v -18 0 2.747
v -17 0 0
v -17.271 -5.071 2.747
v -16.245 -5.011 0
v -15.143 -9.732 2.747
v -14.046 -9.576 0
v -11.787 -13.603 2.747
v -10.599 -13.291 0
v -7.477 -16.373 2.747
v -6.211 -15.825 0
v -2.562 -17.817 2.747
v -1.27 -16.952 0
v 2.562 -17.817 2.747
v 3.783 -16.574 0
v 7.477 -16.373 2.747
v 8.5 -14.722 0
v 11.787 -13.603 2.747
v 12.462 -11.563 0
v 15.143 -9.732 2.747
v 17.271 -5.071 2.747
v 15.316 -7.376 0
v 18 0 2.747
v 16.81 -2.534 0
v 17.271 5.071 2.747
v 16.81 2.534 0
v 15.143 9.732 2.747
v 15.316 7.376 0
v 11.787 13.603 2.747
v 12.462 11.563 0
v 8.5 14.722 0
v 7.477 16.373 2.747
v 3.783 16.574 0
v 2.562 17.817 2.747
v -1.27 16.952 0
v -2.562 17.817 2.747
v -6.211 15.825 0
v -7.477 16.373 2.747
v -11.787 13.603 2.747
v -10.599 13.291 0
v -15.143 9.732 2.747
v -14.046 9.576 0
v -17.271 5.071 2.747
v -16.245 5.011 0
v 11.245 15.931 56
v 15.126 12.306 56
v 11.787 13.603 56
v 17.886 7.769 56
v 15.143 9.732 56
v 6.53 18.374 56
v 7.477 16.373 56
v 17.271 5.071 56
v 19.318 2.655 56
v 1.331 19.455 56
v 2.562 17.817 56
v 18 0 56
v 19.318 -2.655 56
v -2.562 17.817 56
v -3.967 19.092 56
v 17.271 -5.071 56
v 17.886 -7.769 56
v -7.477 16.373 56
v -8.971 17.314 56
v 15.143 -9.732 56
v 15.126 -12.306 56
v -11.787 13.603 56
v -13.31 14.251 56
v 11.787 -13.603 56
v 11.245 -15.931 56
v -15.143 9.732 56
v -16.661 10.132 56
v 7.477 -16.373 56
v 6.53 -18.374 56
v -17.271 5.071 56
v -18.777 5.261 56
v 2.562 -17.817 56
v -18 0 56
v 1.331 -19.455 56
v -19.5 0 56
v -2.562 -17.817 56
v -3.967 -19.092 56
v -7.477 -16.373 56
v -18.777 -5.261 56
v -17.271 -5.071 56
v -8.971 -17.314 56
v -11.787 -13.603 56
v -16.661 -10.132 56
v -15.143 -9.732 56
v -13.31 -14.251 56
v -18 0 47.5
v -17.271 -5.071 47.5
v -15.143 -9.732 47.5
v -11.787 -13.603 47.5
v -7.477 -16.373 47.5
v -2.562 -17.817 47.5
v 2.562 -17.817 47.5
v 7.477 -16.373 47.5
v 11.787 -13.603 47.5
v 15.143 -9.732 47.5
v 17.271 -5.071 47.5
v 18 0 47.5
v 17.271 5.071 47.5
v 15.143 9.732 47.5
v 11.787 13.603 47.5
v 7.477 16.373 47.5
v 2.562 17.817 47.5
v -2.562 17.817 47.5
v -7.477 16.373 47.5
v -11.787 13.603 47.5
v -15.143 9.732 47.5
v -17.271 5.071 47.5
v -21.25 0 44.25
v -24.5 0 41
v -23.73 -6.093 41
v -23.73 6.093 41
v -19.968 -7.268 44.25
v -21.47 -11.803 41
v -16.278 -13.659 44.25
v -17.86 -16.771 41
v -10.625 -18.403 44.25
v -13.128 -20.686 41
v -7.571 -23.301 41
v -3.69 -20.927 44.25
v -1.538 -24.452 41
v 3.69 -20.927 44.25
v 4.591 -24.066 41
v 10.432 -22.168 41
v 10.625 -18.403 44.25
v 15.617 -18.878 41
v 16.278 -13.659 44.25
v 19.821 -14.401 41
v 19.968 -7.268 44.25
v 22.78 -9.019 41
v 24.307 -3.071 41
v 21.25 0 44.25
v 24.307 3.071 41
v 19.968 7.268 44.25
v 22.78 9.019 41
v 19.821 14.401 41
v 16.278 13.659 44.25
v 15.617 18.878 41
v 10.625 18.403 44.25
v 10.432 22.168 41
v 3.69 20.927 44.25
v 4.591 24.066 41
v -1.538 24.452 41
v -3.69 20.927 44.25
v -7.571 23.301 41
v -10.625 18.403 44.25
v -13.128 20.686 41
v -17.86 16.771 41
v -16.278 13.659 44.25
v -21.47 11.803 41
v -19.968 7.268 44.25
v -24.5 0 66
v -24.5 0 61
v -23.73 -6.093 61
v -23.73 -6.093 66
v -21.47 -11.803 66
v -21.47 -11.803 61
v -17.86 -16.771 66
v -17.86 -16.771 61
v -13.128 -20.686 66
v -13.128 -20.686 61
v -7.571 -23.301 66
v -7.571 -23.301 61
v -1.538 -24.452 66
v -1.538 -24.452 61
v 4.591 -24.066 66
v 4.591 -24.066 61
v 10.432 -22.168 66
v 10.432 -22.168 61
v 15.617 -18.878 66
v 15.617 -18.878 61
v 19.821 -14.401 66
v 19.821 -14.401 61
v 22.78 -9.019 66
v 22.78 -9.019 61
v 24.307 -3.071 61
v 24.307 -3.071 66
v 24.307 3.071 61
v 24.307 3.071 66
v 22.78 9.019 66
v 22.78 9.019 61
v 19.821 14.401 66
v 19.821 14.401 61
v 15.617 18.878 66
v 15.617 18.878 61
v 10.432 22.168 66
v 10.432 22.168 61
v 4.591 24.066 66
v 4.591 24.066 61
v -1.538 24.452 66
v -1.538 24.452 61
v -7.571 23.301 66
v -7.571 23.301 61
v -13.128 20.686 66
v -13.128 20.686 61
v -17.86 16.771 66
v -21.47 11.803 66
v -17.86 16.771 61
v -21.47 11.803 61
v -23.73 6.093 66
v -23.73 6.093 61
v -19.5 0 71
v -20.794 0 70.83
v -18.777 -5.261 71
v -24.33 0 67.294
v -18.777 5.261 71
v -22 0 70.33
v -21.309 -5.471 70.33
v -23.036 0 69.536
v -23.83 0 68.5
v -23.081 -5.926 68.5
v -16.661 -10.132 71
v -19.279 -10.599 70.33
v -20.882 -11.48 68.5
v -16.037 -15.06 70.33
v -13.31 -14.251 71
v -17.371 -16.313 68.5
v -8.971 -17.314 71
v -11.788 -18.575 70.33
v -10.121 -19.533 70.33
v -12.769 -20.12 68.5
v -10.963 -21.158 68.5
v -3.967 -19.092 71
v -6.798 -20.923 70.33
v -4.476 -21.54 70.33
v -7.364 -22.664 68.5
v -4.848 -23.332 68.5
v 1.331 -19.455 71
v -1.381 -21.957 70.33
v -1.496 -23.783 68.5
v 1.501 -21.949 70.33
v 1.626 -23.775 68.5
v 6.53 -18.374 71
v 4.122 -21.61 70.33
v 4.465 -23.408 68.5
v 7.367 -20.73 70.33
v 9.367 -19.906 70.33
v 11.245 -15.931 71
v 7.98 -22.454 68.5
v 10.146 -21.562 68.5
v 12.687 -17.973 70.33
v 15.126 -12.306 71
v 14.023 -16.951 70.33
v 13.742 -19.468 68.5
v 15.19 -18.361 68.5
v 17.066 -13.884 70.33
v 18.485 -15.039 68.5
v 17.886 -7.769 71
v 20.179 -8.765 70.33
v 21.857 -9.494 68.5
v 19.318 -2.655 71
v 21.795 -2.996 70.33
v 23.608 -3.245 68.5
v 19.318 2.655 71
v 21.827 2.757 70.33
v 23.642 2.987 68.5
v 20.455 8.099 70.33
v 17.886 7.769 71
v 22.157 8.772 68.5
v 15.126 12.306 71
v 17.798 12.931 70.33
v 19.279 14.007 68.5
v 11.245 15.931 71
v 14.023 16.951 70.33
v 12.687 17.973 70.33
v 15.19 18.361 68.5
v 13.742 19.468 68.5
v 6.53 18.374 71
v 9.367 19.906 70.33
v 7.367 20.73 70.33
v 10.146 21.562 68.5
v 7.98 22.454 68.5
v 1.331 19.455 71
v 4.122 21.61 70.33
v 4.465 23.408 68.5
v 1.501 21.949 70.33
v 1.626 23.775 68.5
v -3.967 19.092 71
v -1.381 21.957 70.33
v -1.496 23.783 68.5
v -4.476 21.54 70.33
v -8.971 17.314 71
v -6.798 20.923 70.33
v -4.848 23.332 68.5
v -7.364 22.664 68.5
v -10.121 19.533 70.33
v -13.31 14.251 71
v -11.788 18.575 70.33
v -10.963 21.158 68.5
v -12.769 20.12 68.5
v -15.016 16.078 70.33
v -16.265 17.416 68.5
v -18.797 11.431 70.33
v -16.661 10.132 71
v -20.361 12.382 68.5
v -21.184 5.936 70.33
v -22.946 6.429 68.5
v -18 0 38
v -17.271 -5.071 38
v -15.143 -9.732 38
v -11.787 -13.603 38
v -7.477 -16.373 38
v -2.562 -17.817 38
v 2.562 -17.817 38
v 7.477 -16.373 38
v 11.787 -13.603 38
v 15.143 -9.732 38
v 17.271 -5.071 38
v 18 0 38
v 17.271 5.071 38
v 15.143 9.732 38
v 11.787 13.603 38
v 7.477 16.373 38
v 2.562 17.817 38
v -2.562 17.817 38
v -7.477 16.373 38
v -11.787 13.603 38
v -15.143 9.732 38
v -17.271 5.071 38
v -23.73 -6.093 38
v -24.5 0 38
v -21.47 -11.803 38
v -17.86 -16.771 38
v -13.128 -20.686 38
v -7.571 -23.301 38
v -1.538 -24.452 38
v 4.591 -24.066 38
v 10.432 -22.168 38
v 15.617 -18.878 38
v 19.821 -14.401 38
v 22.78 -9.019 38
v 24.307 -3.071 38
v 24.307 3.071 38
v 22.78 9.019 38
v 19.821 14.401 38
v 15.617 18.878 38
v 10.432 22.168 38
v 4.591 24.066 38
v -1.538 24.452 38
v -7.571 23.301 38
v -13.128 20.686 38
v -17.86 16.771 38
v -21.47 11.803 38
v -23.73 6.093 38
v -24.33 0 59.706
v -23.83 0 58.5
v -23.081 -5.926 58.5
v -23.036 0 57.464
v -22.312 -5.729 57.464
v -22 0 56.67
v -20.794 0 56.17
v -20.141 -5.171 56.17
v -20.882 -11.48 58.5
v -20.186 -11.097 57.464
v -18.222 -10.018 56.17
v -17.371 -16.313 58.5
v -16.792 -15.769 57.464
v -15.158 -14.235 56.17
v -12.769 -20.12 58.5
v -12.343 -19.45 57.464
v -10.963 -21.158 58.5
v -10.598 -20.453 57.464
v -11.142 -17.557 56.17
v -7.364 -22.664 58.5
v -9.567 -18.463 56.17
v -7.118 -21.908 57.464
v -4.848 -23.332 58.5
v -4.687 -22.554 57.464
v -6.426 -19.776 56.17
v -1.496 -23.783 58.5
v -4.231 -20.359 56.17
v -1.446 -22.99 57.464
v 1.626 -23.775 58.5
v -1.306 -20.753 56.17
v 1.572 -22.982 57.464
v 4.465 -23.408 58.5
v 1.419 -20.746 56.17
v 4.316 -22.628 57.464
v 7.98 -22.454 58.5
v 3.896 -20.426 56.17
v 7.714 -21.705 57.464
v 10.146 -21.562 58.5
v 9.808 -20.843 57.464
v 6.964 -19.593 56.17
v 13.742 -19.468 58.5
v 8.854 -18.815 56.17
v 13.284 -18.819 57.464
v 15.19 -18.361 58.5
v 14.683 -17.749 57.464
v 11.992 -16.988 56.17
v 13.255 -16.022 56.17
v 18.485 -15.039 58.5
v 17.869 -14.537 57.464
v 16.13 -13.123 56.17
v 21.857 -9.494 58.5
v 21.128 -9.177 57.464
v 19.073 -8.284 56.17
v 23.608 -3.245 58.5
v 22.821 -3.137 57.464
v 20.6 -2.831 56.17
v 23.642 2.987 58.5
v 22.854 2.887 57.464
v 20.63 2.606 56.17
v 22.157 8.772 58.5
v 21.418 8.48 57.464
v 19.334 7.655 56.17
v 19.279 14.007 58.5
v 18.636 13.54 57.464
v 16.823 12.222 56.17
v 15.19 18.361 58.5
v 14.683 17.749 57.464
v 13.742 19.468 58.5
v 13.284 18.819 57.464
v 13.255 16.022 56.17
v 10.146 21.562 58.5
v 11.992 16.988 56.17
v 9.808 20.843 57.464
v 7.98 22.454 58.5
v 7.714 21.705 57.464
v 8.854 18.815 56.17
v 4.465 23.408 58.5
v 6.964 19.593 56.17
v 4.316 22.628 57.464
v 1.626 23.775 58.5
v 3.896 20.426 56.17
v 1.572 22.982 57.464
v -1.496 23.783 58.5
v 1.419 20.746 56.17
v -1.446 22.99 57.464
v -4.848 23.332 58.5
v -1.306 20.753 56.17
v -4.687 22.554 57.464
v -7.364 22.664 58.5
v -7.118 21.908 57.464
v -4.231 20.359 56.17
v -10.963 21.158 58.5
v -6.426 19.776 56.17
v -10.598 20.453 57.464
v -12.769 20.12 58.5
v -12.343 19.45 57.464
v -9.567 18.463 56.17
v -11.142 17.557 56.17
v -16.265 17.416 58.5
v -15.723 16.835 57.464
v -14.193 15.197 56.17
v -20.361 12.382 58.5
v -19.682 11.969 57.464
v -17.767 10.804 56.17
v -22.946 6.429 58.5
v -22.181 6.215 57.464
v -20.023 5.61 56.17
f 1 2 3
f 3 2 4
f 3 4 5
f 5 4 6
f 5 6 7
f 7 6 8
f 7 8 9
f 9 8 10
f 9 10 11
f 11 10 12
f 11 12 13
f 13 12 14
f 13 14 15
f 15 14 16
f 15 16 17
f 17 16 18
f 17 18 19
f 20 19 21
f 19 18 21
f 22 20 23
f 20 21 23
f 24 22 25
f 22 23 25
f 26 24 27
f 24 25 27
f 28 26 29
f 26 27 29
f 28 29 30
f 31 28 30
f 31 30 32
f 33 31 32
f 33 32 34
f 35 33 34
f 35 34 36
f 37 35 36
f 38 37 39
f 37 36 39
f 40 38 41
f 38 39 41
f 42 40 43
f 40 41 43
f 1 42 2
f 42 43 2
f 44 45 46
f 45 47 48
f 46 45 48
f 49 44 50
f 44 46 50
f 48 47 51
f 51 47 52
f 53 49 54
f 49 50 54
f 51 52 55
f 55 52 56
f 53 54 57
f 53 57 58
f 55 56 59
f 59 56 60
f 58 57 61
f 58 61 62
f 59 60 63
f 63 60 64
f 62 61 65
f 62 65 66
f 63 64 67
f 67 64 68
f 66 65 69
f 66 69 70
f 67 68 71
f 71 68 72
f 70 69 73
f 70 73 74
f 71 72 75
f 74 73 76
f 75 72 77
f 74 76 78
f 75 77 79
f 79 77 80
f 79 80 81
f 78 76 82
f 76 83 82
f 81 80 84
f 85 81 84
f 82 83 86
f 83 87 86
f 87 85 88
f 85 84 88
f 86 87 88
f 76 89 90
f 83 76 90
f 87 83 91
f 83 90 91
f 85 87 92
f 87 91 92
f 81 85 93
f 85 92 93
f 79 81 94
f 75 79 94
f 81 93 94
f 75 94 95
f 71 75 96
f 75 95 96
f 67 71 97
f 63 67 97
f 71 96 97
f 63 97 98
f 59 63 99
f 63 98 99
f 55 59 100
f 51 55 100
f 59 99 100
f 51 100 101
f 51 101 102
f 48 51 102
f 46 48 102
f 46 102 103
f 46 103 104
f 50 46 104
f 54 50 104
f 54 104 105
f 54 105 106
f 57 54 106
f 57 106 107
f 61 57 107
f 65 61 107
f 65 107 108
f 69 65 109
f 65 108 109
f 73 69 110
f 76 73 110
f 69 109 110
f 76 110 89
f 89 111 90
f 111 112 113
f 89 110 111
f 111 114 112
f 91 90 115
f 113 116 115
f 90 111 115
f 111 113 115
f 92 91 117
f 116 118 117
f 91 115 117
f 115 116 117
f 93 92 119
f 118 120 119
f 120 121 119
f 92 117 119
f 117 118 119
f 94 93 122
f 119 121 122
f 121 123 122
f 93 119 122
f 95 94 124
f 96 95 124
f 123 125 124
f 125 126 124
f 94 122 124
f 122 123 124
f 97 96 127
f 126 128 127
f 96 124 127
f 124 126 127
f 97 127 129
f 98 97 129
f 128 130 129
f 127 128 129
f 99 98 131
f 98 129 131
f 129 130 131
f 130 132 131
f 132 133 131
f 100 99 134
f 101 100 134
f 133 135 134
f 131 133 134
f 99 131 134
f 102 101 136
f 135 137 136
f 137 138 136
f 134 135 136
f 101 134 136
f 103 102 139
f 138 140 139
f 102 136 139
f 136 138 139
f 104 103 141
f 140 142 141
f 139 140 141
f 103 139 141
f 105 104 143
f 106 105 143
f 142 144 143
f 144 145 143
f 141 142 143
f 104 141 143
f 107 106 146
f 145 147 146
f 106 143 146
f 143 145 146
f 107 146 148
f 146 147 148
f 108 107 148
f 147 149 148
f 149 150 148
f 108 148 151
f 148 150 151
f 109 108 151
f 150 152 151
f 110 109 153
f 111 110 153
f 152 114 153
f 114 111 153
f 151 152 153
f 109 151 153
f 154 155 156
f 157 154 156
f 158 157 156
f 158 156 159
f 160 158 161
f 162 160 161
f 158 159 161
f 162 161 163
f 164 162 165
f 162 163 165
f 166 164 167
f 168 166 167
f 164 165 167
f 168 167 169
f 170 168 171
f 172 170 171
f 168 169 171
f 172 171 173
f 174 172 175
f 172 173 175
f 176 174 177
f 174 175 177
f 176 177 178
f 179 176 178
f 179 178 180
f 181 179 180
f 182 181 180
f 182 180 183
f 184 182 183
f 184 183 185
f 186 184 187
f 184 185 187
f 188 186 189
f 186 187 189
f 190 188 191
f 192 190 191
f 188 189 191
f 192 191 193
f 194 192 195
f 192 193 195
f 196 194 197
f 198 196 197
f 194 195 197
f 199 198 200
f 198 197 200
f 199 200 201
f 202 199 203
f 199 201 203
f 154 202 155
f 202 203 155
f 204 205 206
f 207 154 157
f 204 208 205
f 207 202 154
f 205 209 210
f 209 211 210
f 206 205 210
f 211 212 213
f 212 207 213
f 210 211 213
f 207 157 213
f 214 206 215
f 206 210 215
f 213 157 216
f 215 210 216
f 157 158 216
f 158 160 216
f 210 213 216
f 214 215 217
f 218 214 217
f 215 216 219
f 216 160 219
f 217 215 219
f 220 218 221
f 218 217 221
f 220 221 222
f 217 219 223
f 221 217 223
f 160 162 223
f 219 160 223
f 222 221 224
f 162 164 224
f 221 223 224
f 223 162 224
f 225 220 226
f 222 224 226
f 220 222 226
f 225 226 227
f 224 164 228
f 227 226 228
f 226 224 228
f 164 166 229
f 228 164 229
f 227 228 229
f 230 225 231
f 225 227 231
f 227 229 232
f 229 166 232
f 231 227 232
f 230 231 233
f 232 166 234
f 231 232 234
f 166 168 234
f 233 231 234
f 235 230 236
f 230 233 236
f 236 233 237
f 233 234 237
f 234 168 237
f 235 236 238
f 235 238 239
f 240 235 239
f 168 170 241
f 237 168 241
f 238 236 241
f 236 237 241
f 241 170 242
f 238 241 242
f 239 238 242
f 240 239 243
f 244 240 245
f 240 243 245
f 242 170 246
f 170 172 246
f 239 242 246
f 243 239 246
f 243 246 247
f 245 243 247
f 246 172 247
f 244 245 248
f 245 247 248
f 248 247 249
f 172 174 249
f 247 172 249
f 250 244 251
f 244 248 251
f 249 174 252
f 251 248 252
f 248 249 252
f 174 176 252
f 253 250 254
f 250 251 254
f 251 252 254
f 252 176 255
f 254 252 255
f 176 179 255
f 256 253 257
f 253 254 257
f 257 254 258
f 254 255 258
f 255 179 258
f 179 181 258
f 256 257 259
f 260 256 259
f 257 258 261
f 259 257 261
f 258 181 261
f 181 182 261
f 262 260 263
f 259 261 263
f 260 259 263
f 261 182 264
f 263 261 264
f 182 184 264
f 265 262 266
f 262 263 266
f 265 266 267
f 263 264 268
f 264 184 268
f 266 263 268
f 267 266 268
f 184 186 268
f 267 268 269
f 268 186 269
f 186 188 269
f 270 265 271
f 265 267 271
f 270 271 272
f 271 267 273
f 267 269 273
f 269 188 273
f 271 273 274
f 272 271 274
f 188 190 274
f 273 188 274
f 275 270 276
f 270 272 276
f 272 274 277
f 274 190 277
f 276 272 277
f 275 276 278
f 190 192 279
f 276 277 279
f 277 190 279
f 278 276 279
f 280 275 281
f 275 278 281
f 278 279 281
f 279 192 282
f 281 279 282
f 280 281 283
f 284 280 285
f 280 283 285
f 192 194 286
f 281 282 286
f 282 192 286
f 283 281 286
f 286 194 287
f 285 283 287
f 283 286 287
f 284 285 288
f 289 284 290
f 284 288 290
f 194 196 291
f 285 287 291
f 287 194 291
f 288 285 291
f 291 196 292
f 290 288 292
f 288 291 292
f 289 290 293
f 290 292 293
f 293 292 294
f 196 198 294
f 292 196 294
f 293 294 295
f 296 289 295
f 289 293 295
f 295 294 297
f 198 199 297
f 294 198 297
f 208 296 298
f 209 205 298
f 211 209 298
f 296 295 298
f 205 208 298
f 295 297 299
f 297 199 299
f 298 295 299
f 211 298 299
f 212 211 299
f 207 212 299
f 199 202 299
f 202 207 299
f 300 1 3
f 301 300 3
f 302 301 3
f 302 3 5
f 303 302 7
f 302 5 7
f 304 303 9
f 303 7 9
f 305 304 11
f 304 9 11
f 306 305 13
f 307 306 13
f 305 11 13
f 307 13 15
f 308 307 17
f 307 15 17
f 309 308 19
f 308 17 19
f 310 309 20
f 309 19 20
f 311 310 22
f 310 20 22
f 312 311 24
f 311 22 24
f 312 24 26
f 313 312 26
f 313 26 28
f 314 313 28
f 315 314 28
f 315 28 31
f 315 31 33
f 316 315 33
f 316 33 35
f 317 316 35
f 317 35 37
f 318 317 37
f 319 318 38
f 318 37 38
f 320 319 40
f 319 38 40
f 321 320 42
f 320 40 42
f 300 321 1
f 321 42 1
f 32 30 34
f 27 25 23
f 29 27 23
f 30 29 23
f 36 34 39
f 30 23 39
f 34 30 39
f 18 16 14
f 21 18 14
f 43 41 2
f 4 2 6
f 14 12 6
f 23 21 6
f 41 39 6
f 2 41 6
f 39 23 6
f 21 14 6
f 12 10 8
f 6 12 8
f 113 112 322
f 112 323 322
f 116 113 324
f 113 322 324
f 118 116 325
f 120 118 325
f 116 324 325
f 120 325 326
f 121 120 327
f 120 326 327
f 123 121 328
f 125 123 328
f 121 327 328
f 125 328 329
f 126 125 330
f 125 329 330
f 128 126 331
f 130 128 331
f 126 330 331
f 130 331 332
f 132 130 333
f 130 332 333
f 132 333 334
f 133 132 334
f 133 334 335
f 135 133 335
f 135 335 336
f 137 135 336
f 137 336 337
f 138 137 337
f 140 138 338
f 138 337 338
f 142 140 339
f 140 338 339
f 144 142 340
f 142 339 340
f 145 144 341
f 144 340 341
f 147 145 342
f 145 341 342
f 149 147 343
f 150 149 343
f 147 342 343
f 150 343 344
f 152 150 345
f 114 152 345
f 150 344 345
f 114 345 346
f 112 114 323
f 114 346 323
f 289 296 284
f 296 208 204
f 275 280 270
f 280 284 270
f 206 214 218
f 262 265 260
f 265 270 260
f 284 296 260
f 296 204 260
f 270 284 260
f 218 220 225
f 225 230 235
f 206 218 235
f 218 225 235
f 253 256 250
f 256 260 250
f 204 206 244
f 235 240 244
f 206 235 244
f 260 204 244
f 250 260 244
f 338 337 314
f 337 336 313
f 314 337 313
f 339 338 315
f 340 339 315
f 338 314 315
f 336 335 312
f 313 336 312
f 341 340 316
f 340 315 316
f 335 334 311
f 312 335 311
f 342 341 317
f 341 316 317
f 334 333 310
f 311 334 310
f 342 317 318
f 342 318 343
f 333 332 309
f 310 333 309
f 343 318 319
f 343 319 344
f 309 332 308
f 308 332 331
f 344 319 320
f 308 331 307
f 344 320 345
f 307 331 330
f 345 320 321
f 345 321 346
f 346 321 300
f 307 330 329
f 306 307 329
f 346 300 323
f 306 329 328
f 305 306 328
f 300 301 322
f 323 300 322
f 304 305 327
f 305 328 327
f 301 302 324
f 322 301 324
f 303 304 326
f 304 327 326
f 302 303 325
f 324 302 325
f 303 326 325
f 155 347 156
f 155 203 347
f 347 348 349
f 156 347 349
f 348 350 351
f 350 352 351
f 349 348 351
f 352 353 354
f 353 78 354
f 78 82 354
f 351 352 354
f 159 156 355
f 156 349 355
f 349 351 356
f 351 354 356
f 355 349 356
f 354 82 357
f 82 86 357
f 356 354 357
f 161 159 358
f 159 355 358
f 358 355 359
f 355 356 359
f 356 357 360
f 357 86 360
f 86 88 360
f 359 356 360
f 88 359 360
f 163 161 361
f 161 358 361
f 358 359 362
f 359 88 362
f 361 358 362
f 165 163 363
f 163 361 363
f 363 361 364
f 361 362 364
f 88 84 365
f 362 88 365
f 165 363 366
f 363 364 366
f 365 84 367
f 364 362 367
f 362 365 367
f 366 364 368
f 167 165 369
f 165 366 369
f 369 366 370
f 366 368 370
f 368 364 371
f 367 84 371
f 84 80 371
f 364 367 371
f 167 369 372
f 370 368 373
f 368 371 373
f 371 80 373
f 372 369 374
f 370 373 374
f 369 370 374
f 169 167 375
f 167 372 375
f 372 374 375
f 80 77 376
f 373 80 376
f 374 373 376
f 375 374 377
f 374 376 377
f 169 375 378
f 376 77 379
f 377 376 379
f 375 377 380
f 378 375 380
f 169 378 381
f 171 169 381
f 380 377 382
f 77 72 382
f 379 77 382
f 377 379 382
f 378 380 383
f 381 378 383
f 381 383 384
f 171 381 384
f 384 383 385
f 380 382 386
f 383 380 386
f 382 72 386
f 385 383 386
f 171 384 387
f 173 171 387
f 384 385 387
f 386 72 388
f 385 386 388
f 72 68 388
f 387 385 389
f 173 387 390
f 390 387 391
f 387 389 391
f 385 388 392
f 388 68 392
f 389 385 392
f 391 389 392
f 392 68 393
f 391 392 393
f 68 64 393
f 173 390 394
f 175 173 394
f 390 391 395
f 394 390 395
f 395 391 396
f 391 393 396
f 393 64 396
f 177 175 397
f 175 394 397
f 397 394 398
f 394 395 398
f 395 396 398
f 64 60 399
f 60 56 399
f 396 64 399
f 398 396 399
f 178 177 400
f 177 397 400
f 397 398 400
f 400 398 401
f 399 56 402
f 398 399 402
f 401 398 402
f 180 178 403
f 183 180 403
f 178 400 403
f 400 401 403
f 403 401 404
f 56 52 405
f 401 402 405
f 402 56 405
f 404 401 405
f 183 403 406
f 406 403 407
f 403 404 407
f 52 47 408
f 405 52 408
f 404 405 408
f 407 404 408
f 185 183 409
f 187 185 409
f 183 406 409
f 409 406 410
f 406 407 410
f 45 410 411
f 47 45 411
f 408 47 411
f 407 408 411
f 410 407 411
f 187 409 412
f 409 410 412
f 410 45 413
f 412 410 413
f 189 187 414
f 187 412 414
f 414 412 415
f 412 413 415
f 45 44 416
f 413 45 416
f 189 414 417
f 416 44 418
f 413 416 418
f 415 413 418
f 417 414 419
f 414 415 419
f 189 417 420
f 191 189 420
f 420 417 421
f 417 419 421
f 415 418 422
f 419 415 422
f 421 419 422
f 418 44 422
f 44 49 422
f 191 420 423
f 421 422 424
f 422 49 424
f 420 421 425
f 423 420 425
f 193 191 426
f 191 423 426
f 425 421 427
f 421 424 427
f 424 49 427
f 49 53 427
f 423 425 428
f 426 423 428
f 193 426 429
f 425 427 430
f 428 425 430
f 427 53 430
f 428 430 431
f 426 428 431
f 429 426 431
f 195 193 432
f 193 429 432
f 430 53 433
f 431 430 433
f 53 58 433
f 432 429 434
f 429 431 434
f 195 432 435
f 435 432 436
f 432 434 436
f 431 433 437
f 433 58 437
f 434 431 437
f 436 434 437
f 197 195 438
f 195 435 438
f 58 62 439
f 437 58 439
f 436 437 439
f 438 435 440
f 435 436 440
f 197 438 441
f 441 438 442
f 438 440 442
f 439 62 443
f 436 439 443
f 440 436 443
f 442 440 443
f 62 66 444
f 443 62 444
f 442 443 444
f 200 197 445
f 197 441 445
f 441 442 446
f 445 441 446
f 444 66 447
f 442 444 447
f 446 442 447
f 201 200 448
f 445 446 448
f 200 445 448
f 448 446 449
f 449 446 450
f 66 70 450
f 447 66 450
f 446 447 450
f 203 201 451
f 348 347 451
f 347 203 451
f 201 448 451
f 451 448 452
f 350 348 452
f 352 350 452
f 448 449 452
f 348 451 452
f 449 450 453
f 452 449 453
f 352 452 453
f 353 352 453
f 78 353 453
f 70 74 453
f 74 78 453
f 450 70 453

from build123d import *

# Parameters (mm, degrees)
F2_R     = 5
F3_SIZE  = 6.49999
F4_SIZE2 = 1
F4_SIZE  = 2.7474774195


# Not quite as in the source:
# - a fillet or chamfer is up to 0.001 mm smaller than in the source, because OpenCascade refuses the exact size


with BuildPart() as f1:
    # F0 (on Front) → F1 (revolve)
    with BuildSketch(Plane.XZ):
        Polygon((-18, 0), (0, 0), (0, 71), (-24.5, 71), (-24.5, 56), (-18, 56), (-18, 41), (-24.5, 41), (-24.5, 38), (-18, 38), align=None)
    revolve(axis=Axis((0, 0, 35.5), (0, 0, 1)))

    # F2
    f2_edges = [f1.edges().sort_by_distance(p)[0] for p in [
        (24.5, 0, 56),
        (24.5, 0, 71),
    ]]
    fillet(f2_edges, radius=F2_R)

    # F3 (size 6.5 in the source; OpenCascade refuses exactly that, so slightly less here)
    f3_edges = [f1.edges().sort_by_distance(p)[0] for p in [
        (18, 0, 41),
    ]]
    chamfer(f3_edges, length=F3_SIZE)

    # F4
    f4_edges = [f1.edges().sort_by_distance(p)[0] for p in [
        (18, 0, 0),
    ]]
    f4_side = f1.faces().sort_by_distance((18, 0, 19))[0]
    chamfer(f4_edges, length=F4_SIZE, length2=F4_SIZE2, reference=f4_side)


solid = f1.part
